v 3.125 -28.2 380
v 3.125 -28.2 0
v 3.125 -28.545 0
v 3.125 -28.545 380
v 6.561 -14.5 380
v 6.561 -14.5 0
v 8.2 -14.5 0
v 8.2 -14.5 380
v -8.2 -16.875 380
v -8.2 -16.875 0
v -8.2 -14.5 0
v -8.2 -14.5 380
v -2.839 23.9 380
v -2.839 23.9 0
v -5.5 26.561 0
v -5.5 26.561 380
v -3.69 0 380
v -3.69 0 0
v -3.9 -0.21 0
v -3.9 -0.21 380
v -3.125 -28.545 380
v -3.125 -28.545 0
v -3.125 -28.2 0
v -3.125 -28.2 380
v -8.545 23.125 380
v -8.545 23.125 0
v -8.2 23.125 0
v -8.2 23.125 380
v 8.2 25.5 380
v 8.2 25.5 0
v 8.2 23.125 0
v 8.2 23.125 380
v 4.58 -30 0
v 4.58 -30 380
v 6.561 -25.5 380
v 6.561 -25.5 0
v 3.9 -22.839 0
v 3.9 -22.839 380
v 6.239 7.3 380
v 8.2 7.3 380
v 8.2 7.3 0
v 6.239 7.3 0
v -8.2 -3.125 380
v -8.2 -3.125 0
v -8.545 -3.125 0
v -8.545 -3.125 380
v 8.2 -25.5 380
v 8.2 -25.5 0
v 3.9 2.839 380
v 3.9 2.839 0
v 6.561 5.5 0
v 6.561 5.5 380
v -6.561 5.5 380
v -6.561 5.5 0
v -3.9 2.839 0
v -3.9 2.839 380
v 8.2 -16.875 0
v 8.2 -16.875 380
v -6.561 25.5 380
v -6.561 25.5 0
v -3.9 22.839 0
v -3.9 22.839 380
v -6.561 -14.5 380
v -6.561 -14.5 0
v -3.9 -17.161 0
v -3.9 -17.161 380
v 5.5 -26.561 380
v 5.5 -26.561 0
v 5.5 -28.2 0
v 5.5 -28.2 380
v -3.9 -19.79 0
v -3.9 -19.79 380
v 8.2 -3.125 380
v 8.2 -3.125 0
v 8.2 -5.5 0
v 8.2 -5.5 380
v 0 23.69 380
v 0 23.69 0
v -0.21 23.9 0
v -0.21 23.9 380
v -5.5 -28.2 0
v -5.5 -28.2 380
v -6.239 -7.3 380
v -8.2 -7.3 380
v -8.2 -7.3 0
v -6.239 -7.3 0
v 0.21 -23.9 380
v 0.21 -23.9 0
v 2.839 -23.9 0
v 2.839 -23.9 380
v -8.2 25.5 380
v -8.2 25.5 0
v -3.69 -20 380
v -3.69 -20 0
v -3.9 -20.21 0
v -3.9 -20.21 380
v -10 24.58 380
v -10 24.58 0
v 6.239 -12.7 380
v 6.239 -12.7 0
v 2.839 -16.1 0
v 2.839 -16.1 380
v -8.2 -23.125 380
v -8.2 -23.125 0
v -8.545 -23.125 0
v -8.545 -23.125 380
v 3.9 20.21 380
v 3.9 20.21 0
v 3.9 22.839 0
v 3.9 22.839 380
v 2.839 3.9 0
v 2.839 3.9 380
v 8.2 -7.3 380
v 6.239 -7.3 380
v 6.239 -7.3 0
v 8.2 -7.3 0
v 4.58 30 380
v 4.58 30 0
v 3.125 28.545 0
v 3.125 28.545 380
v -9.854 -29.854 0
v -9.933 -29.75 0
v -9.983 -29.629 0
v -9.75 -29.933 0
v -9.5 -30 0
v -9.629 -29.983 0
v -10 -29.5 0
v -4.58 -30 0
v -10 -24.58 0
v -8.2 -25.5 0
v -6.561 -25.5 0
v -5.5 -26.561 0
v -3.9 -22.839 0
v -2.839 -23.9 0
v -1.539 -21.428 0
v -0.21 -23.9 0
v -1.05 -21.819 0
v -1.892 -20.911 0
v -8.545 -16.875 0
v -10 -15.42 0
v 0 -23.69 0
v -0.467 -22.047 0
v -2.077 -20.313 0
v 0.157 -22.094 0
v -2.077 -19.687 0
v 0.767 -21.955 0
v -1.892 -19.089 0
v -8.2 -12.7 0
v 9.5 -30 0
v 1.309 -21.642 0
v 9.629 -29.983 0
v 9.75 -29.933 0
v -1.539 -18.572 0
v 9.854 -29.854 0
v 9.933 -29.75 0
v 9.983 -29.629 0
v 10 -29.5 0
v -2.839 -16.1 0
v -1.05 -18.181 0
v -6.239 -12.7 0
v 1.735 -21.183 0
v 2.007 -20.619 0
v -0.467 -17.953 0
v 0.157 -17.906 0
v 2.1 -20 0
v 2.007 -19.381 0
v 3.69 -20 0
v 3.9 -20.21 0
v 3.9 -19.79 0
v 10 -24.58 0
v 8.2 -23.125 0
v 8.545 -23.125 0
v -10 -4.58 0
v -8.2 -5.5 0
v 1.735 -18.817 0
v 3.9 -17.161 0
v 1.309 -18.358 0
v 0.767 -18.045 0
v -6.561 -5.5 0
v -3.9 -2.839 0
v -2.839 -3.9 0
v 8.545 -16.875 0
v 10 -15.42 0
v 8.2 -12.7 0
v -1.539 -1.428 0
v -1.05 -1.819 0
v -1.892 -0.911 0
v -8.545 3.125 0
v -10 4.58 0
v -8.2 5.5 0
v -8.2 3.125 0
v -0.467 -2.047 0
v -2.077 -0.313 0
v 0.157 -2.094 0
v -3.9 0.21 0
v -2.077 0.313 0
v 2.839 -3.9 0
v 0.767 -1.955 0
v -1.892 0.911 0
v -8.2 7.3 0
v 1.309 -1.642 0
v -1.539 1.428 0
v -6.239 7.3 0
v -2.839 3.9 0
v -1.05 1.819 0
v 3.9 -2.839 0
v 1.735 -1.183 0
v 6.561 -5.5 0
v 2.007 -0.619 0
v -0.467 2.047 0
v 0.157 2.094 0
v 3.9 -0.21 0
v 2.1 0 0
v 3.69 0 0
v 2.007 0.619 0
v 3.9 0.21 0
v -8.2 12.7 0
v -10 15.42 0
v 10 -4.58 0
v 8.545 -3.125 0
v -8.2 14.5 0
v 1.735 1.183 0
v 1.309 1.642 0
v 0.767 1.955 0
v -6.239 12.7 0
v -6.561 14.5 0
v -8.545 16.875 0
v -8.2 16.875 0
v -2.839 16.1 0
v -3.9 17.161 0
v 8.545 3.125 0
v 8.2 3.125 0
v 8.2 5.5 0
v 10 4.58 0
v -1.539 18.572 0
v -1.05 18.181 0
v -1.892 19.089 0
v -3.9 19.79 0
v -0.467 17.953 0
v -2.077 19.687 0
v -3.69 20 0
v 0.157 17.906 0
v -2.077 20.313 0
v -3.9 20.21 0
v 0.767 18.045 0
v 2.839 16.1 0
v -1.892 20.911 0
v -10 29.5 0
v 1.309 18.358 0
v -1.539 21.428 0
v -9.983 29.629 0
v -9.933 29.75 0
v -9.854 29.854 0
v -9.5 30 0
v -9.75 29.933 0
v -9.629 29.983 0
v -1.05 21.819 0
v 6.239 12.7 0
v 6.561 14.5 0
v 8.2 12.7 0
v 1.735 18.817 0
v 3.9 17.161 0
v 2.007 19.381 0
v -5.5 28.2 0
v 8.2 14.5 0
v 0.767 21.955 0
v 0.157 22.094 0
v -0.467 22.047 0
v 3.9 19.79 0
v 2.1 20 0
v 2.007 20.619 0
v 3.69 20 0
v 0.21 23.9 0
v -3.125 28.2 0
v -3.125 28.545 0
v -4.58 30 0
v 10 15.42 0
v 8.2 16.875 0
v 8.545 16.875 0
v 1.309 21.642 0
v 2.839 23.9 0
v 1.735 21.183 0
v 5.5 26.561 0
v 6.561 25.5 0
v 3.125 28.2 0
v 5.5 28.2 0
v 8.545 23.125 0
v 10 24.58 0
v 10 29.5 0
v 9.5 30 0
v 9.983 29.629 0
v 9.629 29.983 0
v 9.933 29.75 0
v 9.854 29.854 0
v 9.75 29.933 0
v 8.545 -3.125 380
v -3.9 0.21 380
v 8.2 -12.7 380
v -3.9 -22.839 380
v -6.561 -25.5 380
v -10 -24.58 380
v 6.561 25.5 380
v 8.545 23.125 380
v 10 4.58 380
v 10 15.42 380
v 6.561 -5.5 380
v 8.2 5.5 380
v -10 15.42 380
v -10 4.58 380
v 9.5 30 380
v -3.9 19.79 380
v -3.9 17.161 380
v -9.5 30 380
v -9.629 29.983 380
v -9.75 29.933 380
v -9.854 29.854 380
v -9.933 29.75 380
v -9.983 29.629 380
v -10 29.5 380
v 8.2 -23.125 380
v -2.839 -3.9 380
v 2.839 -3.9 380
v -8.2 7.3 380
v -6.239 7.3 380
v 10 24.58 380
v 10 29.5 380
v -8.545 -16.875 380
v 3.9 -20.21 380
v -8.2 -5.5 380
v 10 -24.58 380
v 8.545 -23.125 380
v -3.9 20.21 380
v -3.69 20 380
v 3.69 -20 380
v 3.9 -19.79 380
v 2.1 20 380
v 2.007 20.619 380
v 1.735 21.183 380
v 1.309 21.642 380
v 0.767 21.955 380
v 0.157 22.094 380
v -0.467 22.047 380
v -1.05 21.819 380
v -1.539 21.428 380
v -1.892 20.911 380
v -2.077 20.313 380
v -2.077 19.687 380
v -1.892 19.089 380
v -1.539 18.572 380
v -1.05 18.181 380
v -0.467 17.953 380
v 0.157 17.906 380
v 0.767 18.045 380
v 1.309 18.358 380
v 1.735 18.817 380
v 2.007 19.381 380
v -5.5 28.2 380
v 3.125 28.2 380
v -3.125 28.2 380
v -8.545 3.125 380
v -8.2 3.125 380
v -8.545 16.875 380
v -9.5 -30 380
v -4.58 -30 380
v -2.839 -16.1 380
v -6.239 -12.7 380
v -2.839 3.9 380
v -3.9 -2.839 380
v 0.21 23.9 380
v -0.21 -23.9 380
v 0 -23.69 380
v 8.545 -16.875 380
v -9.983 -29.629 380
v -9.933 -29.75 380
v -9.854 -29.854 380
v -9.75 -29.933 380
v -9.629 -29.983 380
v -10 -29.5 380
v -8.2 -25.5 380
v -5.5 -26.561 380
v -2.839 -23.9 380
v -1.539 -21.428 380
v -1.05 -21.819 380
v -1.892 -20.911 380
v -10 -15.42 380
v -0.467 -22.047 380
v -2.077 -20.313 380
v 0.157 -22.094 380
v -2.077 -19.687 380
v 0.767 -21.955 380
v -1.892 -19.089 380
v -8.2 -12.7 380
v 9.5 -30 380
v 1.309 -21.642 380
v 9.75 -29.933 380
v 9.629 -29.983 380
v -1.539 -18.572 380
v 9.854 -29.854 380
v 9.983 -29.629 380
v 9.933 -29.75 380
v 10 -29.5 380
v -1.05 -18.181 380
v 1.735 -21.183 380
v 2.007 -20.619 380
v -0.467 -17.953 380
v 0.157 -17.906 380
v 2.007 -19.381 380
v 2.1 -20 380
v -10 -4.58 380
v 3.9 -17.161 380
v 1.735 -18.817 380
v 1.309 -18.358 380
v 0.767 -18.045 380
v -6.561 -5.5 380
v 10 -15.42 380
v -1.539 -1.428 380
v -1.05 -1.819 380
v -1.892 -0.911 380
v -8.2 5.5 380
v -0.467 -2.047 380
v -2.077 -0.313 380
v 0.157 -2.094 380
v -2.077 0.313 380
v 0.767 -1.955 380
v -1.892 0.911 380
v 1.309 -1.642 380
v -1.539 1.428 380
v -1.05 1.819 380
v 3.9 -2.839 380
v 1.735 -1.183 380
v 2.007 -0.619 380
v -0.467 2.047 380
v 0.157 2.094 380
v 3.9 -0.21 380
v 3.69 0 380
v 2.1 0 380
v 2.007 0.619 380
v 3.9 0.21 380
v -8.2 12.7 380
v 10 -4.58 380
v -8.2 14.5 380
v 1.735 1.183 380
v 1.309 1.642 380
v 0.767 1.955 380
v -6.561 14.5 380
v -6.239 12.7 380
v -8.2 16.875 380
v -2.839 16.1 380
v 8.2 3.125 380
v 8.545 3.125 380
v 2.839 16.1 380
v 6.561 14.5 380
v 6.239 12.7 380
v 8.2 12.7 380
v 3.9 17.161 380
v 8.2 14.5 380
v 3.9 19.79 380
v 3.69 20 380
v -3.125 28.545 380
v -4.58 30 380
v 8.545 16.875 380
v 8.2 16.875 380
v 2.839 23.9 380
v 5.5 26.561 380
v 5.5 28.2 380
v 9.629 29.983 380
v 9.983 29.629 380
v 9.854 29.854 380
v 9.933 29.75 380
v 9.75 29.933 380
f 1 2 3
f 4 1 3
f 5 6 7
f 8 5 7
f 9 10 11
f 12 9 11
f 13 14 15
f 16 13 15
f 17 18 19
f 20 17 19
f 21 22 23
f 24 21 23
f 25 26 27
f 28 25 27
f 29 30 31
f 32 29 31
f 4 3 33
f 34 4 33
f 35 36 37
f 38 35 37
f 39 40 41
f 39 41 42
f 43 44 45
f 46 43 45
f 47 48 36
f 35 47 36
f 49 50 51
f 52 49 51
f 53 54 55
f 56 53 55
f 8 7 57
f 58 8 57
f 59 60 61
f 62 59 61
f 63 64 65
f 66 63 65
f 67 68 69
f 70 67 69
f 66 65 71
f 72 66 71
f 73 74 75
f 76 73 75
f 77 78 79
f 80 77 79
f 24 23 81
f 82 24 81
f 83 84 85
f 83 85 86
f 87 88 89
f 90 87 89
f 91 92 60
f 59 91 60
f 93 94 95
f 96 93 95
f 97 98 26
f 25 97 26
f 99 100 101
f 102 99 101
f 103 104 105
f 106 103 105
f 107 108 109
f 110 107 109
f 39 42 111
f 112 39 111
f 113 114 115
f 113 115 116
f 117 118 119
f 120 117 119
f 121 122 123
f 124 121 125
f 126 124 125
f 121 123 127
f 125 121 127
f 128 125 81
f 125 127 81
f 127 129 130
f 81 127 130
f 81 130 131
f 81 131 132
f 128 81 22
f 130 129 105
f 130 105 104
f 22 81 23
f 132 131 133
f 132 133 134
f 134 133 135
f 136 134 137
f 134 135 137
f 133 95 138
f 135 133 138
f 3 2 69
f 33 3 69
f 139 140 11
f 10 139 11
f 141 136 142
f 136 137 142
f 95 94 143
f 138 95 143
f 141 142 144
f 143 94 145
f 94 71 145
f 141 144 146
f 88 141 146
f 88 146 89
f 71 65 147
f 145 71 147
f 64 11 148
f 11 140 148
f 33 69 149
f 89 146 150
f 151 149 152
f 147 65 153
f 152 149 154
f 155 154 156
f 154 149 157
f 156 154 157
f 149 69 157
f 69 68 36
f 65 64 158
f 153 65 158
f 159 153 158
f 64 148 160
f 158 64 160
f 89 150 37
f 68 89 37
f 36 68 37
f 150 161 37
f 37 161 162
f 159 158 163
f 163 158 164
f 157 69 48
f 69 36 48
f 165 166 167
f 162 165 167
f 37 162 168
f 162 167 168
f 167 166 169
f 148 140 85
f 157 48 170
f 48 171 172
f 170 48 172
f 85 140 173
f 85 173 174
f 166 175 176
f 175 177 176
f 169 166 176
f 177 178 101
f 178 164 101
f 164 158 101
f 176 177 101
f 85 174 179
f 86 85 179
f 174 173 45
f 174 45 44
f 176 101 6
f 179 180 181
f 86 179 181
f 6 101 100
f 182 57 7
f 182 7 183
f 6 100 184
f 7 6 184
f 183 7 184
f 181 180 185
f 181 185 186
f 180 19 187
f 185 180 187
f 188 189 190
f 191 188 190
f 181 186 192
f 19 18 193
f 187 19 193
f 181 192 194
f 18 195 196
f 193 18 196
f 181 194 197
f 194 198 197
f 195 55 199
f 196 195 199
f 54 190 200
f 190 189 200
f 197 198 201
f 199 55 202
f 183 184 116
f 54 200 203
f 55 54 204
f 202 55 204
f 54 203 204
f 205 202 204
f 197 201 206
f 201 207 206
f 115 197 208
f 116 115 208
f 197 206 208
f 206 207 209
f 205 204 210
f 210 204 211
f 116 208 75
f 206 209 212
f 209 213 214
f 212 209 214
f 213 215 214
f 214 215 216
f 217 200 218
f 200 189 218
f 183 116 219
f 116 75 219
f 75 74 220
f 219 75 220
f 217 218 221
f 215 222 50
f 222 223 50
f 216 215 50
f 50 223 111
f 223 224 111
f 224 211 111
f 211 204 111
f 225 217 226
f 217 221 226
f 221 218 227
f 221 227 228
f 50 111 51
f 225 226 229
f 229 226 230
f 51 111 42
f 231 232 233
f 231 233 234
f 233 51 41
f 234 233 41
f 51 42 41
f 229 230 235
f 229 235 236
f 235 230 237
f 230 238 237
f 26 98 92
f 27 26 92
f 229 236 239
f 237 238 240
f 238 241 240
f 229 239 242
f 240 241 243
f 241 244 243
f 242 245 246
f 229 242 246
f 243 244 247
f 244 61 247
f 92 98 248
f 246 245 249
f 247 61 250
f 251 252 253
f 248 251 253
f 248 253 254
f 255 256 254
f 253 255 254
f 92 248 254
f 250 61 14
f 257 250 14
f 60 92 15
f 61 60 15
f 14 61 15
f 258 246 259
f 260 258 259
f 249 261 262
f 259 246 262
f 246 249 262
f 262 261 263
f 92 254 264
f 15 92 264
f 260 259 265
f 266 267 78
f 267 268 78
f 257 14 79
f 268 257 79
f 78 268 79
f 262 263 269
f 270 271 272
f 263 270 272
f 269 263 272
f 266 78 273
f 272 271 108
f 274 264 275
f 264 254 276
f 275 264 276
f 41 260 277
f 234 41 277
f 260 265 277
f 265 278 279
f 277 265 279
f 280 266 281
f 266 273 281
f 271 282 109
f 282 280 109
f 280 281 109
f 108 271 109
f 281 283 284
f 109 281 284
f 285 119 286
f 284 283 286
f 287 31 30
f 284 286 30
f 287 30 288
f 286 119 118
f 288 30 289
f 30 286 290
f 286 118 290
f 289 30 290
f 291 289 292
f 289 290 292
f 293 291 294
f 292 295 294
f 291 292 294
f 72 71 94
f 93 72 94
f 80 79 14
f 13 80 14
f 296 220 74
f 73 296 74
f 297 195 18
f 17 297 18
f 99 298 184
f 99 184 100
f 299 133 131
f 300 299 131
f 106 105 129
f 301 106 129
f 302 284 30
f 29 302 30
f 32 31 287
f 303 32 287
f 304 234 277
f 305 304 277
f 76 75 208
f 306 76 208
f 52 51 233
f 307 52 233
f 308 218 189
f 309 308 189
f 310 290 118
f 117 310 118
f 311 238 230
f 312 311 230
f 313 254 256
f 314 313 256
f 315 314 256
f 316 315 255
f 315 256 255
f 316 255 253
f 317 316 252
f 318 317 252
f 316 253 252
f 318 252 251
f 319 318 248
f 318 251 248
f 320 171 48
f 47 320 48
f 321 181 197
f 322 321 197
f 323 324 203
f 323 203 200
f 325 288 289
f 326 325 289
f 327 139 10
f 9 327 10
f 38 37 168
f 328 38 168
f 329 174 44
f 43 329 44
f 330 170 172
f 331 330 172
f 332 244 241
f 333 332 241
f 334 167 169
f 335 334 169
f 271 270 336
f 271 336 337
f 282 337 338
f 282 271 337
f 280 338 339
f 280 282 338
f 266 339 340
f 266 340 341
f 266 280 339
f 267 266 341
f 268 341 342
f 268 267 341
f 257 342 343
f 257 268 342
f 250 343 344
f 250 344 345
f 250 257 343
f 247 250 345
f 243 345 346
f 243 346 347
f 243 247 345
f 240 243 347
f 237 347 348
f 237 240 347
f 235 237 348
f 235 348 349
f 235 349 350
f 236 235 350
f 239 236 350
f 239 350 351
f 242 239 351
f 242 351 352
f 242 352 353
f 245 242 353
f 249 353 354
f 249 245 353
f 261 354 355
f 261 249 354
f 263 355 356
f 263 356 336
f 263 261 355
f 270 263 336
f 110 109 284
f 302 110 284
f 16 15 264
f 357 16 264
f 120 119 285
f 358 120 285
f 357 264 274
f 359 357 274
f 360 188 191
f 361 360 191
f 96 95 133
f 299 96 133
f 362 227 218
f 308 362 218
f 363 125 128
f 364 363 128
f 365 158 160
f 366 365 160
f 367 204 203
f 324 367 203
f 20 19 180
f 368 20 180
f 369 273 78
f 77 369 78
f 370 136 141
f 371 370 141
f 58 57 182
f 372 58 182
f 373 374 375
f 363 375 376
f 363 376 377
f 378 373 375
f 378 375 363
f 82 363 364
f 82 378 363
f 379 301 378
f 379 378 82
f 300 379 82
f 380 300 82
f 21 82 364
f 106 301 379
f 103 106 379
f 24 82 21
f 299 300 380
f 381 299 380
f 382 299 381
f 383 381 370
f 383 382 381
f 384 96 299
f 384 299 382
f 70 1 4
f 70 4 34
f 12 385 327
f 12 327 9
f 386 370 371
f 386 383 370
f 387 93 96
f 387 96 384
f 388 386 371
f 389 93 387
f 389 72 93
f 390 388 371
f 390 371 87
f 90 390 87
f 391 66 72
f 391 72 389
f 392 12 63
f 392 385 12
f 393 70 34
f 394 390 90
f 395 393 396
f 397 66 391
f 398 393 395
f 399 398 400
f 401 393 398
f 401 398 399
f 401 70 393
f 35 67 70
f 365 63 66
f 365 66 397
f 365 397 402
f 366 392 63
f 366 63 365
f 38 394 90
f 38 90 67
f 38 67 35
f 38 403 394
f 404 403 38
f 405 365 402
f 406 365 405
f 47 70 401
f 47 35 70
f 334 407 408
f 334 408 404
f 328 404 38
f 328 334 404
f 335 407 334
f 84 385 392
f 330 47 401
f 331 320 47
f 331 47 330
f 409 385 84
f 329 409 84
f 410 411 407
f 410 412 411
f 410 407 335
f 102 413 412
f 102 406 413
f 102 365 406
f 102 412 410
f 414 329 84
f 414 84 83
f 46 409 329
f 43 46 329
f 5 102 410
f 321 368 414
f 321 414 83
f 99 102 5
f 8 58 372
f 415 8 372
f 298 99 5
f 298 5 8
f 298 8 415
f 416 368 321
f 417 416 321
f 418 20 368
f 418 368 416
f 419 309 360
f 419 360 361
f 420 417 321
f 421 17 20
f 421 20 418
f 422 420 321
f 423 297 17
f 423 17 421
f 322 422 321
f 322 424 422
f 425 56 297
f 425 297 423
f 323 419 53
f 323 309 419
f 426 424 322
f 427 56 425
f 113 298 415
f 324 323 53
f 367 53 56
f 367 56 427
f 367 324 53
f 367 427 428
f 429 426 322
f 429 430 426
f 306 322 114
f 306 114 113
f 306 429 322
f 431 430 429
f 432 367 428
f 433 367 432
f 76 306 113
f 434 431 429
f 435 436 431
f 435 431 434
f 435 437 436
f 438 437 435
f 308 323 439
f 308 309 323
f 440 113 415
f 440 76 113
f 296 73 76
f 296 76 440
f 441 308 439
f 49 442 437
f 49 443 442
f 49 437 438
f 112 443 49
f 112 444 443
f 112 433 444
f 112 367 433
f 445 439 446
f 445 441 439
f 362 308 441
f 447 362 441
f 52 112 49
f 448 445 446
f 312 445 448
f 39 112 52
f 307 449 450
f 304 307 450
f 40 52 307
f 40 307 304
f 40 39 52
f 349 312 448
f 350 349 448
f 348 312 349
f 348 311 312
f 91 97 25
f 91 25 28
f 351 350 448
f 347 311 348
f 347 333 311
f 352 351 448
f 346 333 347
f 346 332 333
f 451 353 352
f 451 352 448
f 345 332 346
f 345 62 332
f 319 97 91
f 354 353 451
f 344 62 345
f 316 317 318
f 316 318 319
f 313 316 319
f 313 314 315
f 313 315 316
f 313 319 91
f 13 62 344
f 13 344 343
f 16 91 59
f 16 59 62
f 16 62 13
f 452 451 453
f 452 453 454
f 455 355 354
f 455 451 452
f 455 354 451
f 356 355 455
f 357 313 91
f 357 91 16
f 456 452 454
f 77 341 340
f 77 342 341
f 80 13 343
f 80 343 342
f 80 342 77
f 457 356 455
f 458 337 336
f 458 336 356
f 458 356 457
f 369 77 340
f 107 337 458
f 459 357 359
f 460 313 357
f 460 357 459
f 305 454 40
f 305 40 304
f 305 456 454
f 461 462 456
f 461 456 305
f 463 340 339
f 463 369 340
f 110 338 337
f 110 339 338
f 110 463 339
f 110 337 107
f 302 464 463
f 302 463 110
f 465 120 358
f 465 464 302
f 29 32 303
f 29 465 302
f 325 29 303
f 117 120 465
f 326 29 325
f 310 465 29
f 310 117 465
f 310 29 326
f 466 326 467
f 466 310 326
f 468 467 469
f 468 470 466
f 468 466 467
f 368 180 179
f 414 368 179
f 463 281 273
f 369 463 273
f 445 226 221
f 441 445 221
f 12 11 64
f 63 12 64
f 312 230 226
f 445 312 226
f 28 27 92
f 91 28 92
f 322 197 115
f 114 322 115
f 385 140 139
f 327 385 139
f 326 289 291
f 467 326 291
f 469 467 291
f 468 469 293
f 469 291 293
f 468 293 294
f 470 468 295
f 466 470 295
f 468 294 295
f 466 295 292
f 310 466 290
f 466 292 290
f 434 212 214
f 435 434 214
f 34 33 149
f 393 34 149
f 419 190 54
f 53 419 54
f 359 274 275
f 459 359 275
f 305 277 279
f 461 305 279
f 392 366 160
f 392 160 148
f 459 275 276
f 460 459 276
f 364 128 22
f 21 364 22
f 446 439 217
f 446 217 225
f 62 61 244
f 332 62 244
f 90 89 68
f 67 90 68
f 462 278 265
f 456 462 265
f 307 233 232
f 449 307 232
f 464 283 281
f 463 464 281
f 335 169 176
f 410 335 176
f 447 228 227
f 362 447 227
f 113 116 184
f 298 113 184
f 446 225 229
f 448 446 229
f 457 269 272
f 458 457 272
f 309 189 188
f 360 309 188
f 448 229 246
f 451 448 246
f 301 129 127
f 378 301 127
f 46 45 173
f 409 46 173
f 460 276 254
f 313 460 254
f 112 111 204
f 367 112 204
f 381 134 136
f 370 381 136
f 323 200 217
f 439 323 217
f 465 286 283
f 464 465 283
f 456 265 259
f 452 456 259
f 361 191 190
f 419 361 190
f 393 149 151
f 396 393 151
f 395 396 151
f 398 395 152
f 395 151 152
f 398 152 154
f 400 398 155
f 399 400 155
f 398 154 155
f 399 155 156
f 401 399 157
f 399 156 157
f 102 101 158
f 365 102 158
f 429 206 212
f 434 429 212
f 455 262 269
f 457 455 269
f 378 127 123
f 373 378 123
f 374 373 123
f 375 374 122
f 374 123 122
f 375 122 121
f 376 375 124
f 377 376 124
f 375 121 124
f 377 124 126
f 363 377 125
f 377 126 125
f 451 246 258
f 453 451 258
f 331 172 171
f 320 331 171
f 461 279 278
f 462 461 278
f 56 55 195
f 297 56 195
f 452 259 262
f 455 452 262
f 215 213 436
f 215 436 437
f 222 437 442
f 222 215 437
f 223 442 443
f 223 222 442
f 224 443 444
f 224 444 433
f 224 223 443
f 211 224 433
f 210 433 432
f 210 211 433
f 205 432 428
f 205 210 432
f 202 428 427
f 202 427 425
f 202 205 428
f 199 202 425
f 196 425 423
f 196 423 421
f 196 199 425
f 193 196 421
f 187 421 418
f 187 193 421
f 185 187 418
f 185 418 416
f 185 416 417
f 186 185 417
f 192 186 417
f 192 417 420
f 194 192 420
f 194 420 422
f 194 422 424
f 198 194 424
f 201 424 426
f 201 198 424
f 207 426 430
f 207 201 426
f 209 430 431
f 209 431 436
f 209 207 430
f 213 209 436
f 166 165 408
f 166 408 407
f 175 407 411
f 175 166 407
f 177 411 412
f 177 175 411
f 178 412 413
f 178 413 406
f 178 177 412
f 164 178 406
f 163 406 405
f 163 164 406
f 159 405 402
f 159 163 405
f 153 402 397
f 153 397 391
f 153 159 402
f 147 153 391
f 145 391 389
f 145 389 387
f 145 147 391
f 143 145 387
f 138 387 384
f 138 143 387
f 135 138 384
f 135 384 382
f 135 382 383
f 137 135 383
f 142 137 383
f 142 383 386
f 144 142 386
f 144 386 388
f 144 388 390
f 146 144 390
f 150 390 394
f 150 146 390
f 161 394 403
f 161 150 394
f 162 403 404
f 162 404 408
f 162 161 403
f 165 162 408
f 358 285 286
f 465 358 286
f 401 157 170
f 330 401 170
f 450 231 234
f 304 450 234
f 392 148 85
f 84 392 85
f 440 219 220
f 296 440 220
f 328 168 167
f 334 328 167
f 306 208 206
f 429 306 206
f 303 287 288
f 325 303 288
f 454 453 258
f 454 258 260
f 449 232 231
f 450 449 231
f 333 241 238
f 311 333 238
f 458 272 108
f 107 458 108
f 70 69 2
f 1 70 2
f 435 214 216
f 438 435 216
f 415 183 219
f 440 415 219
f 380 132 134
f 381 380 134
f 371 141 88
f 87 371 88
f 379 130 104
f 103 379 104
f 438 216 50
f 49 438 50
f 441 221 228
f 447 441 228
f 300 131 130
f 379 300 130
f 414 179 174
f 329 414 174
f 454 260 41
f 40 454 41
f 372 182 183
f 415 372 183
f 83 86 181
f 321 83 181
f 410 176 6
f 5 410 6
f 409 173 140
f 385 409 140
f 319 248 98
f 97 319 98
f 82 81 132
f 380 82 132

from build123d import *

# Parameters (mm, degrees)
SKETCH1_R           = 2.1
BOSS_EXTRUDE1_DEPTH = 380


with BuildPart() as part:
    # Sketch1 → Boss-Extrude1 (new body)
    with BuildSketch(Plane.XY):
        with BuildLine():
            Line((4.58, -30), (9.5, -30))
            ThreePointArc((9.5, -30), (9.853553391, -29.853553391), (10, -29.5))
            Line((10, -29.5), (10, -24.58))
            Line((10, -24.58), (8.545, -23.125))
            Line((8.545, -23.125), (8.2, -23.125))
            Line((8.2, -23.125), (8.2, -25.5))
            Line((8.2, -25.5), (6.560660172, -25.5))
            Line((6.560660172, -25.5), (3.9, -22.839339828))
            Line((3.9, -22.839339828), (3.9, -20.21))
            Line((3.9, -20.21), (3.69, -20))
            Line((3.69, -20), (3.9, -19.79))
            Line((3.9, -19.79), (3.9, -17.160660172))
            Line((3.9, -17.160660172), (6.560660172, -14.5))
            Line((6.560660172, -14.5), (8.2, -14.5))
            Line((8.2, -14.5), (8.2, -16.875))
            Line((8.2, -16.875), (8.545, -16.875))
            Line((8.545, -16.875), (10, -15.42))
            Line((10, -15.42), (10, -4.58))
            Line((10, -4.58), (8.545, -3.125))
            Line((8.545, -3.125), (8.2, -3.125))
            Line((8.2, -3.125), (8.2, -5.5))
            Line((8.2, -5.5), (6.560660172, -5.5))
            Line((6.560660172, -5.5), (3.9, -2.839339828))
            Line((3.9, -2.839339828), (3.9, -0.21))
            Line((3.9, -0.21), (3.69, 0))
            Line((3.69, 0), (3.9, 0.21))
            Line((3.9, 0.21), (3.9, 2.839339828))
            Line((3.9, 2.839339828), (6.560660172, 5.5))
            Line((6.560660172, 5.5), (8.2, 5.5))
            Line((8.2, 5.5), (8.2, 3.125))
            Line((8.2, 3.125), (8.545, 3.125))
            Line((8.545, 3.125), (10, 4.58))
            Line((10, 4.58), (10, 15.42))
            Line((10, 15.42), (8.545, 16.875))
            Line((8.545, 16.875), (8.2, 16.875))
            Line((8.2, 16.875), (8.2, 14.5))
            Line((8.2, 14.5), (6.560660172, 14.5))
            Line((6.560660172, 14.5), (3.9, 17.160660172))
            Line((3.9, 17.160660172), (3.9, 19.79))
            Line((3.9, 19.79), (3.69, 20))
            Line((3.69, 20), (3.9, 20.21))
            Line((3.9, 20.21), (3.9, 22.839339828))
            Line((3.9, 22.839339828), (6.560660172, 25.5))
            Line((6.560660172, 25.5), (8.2, 25.5))
            Line((8.2, 25.5), (8.2, 23.125))
            Line((8.2, 23.125), (8.545, 23.125))
            Line((8.545, 23.125), (10, 24.58))
            Line((10, 24.58), (10, 29.5))
            ThreePointArc((10, 29.5), (9.853553391, 29.853553391), (9.5, 30))
            Line((9.5, 30), (4.58, 30))
            Line((4.58, 30), (3.125, 28.545))
            Line((3.125, 28.545), (3.125, 28.2))
            Line((3.125, 28.2), (5.5, 28.2))
            Line((5.5, 28.2), (5.5, 26.560660172))
            Line((5.5, 26.560660172), (2.839339828, 23.9))
            Line((2.839339828, 23.9), (0.21, 23.9))
            Line((0.21, 23.9), (0, 23.69))
            Line((0, 23.69), (-0.21, 23.9))
            Line((-0.21, 23.9), (-2.839339828, 23.9))
            Line((-2.839339828, 23.9), (-5.5, 26.560660172))
            Line((-5.5, 26.560660172), (-5.5, 28.2))
            Line((-5.5, 28.2), (-3.125, 28.2))
            Line((-3.125, 28.2), (-3.125, 28.545))
            Line((-3.125, 28.545), (-4.58, 30))
            Line((-4.58, 30), (-9.5, 30))
            ThreePointArc((-9.5, 30), (-9.853553391, 29.853553391), (-10, 29.5))
            Line((-10, 29.5), (-10, 24.58))
            Line((-10, 24.58), (-8.545, 23.125))
            Line((-8.545, 23.125), (-8.2, 23.125))
            Line((-8.2, 23.125), (-8.2, 25.5))
            Line((-8.2, 25.5), (-6.560660172, 25.5))
            Line((-6.560660172, 25.5), (-3.9, 22.839339828))
            Line((-3.9, 22.839339828), (-3.9, 20.21))
            Line((-3.9, 20.21), (-3.69, 20))
            Line((-3.69, 20), (-3.9, 19.79))
            Line((-3.9, 19.79), (-3.9, 17.160660172))
            Line((-3.9, 17.160660172), (-6.560660172, 14.5))
            Line((-6.560660172, 14.5), (-8.2, 14.5))
            Line((-8.2, 14.5), (-8.2, 16.875))
            Line((-8.2, 16.875), (-8.545, 16.875))
            Line((-8.545, 16.875), (-10, 15.42))
            Line((-10, 15.42), (-10, 4.58))
            Line((-10, 4.58), (-8.545, 3.125))
            Line((-8.545, 3.125), (-8.2, 3.125))
            Line((-8.2, 3.125), (-8.2, 5.5))
            Line((-8.2, 5.5), (-6.560660172, 5.5))
            Line((-6.560660172, 5.5), (-3.9, 2.839339828))
            Line((-3.9, 2.839339828), (-3.9, 0.21))
            Line((-3.9, 0.21), (-3.69, 0))
            Line((-3.69, 0), (-3.9, -0.21))
            Line((-3.9, -0.21), (-3.9, -2.839339828))
            Line((-3.9, -2.839339828), (-6.560660172, -5.5))
            Line((-6.560660172, -5.5), (-8.2, -5.5))
            Line((-8.2, -5.5), (-8.2, -3.125))
            Line((-8.2, -3.125), (-8.545, -3.125))
            Line((-8.545, -3.125), (-10, -4.58))
            Line((-10, -4.58), (-10, -15.42))
            Line((-10, -15.42), (-8.545, -16.875))
            Line((-8.545, -16.875), (-8.2, -16.875))
            Line((-8.2, -16.875), (-8.2, -14.5))
            Line((-8.2, -14.5), (-6.560660172, -14.5))
            Line((-6.560660172, -14.5), (-3.9, -17.160660172))
            Line((-3.9, -17.160660172), (-3.9, -19.79))
            Line((-3.9, -19.79), (-3.69, -20))
            Line((-3.69, -20), (-3.9, -20.21))
            Line((-3.9, -20.21), (-3.9, -22.839339828))
            Line((-3.9, -22.839339828), (-6.560660172, -25.5))
            Line((-6.560660172, -25.5), (-8.2, -25.5))
            Line((-8.2, -25.5), (-8.2, -23.125))
            Line((-8.2, -23.125), (-8.545, -23.125))
            Line((-8.545, -23.125), (-10, -24.58))
            Line((-10, -24.58), (-10, -29.5))
            ThreePointArc((-10, -29.5), (-9.853553391, -29.853553391), (-9.5, -30))
            Line((-9.5, -30), (-4.58, -30))
            Line((-4.58, -30), (-3.125, -28.545))
            Line((-3.125, -28.545), (-3.125, -28.2))
            Line((-3.125, -28.2), (-5.5, -28.2))
            Line((-5.5, -28.2), (-5.5, -26.560660172))
            Line((-5.5, -26.560660172), (-2.839339828, -23.9))
            Line((-2.839339828, -23.9), (-0.21, -23.9))
            Line((-0.21, -23.9), (0, -23.69))
            Line((0, -23.69), (0.21, -23.9))
            Line((0.21, -23.9), (2.839339828, -23.9))
            Line((2.839339828, -23.9), (5.5, -26.560660172))
            Line((5.5, -26.560660172), (5.5, -28.2))
            Line((5.5, -28.2), (3.125, -28.2))
            Line((3.125, -28.2), (3.125, -28.545))
            Line((3.125, -28.545), (4.58, -30))
        make_face()
        with Locations((0, -20)):
            Circle(SKETCH1_R, mode=Mode.SUBTRACT)
        Polygon((-6.239339828, -12.7), (-8.2, -12.7), (-8.2, -7.3), (-6.239339828, -7.3), (-2.839339828, -3.9), (2.839339828, -3.9), (6.239339828, -7.3), (8.2, -7.3), (8.2, -12.7), (6.239339828, -12.7), (2.839339828, -16.1), (-2.839339828, -16.1), align=None, mode=Mode.SUBTRACT)
        Polygon((-6.239339828, 7.3), (-8.2, 7.3), (-8.2, 12.7), (-6.239339828, 12.7), (-2.839339828, 16.1), (2.839339828, 16.1), (6.239339828, 12.7), (8.2, 12.7), (8.2, 7.3), (6.239339828, 7.3), (2.839339828, 3.9), (-2.839339828, 3.9), align=None, mode=Mode.SUBTRACT)
        with Locations((0, 20)):
            Circle(SKETCH1_R, mode=Mode.SUBTRACT)
        Circle(SKETCH1_R, mode=Mode.SUBTRACT)
    extrude(amount=BOSS_EXTRUDE1_DEPTH)


solid = part.part
